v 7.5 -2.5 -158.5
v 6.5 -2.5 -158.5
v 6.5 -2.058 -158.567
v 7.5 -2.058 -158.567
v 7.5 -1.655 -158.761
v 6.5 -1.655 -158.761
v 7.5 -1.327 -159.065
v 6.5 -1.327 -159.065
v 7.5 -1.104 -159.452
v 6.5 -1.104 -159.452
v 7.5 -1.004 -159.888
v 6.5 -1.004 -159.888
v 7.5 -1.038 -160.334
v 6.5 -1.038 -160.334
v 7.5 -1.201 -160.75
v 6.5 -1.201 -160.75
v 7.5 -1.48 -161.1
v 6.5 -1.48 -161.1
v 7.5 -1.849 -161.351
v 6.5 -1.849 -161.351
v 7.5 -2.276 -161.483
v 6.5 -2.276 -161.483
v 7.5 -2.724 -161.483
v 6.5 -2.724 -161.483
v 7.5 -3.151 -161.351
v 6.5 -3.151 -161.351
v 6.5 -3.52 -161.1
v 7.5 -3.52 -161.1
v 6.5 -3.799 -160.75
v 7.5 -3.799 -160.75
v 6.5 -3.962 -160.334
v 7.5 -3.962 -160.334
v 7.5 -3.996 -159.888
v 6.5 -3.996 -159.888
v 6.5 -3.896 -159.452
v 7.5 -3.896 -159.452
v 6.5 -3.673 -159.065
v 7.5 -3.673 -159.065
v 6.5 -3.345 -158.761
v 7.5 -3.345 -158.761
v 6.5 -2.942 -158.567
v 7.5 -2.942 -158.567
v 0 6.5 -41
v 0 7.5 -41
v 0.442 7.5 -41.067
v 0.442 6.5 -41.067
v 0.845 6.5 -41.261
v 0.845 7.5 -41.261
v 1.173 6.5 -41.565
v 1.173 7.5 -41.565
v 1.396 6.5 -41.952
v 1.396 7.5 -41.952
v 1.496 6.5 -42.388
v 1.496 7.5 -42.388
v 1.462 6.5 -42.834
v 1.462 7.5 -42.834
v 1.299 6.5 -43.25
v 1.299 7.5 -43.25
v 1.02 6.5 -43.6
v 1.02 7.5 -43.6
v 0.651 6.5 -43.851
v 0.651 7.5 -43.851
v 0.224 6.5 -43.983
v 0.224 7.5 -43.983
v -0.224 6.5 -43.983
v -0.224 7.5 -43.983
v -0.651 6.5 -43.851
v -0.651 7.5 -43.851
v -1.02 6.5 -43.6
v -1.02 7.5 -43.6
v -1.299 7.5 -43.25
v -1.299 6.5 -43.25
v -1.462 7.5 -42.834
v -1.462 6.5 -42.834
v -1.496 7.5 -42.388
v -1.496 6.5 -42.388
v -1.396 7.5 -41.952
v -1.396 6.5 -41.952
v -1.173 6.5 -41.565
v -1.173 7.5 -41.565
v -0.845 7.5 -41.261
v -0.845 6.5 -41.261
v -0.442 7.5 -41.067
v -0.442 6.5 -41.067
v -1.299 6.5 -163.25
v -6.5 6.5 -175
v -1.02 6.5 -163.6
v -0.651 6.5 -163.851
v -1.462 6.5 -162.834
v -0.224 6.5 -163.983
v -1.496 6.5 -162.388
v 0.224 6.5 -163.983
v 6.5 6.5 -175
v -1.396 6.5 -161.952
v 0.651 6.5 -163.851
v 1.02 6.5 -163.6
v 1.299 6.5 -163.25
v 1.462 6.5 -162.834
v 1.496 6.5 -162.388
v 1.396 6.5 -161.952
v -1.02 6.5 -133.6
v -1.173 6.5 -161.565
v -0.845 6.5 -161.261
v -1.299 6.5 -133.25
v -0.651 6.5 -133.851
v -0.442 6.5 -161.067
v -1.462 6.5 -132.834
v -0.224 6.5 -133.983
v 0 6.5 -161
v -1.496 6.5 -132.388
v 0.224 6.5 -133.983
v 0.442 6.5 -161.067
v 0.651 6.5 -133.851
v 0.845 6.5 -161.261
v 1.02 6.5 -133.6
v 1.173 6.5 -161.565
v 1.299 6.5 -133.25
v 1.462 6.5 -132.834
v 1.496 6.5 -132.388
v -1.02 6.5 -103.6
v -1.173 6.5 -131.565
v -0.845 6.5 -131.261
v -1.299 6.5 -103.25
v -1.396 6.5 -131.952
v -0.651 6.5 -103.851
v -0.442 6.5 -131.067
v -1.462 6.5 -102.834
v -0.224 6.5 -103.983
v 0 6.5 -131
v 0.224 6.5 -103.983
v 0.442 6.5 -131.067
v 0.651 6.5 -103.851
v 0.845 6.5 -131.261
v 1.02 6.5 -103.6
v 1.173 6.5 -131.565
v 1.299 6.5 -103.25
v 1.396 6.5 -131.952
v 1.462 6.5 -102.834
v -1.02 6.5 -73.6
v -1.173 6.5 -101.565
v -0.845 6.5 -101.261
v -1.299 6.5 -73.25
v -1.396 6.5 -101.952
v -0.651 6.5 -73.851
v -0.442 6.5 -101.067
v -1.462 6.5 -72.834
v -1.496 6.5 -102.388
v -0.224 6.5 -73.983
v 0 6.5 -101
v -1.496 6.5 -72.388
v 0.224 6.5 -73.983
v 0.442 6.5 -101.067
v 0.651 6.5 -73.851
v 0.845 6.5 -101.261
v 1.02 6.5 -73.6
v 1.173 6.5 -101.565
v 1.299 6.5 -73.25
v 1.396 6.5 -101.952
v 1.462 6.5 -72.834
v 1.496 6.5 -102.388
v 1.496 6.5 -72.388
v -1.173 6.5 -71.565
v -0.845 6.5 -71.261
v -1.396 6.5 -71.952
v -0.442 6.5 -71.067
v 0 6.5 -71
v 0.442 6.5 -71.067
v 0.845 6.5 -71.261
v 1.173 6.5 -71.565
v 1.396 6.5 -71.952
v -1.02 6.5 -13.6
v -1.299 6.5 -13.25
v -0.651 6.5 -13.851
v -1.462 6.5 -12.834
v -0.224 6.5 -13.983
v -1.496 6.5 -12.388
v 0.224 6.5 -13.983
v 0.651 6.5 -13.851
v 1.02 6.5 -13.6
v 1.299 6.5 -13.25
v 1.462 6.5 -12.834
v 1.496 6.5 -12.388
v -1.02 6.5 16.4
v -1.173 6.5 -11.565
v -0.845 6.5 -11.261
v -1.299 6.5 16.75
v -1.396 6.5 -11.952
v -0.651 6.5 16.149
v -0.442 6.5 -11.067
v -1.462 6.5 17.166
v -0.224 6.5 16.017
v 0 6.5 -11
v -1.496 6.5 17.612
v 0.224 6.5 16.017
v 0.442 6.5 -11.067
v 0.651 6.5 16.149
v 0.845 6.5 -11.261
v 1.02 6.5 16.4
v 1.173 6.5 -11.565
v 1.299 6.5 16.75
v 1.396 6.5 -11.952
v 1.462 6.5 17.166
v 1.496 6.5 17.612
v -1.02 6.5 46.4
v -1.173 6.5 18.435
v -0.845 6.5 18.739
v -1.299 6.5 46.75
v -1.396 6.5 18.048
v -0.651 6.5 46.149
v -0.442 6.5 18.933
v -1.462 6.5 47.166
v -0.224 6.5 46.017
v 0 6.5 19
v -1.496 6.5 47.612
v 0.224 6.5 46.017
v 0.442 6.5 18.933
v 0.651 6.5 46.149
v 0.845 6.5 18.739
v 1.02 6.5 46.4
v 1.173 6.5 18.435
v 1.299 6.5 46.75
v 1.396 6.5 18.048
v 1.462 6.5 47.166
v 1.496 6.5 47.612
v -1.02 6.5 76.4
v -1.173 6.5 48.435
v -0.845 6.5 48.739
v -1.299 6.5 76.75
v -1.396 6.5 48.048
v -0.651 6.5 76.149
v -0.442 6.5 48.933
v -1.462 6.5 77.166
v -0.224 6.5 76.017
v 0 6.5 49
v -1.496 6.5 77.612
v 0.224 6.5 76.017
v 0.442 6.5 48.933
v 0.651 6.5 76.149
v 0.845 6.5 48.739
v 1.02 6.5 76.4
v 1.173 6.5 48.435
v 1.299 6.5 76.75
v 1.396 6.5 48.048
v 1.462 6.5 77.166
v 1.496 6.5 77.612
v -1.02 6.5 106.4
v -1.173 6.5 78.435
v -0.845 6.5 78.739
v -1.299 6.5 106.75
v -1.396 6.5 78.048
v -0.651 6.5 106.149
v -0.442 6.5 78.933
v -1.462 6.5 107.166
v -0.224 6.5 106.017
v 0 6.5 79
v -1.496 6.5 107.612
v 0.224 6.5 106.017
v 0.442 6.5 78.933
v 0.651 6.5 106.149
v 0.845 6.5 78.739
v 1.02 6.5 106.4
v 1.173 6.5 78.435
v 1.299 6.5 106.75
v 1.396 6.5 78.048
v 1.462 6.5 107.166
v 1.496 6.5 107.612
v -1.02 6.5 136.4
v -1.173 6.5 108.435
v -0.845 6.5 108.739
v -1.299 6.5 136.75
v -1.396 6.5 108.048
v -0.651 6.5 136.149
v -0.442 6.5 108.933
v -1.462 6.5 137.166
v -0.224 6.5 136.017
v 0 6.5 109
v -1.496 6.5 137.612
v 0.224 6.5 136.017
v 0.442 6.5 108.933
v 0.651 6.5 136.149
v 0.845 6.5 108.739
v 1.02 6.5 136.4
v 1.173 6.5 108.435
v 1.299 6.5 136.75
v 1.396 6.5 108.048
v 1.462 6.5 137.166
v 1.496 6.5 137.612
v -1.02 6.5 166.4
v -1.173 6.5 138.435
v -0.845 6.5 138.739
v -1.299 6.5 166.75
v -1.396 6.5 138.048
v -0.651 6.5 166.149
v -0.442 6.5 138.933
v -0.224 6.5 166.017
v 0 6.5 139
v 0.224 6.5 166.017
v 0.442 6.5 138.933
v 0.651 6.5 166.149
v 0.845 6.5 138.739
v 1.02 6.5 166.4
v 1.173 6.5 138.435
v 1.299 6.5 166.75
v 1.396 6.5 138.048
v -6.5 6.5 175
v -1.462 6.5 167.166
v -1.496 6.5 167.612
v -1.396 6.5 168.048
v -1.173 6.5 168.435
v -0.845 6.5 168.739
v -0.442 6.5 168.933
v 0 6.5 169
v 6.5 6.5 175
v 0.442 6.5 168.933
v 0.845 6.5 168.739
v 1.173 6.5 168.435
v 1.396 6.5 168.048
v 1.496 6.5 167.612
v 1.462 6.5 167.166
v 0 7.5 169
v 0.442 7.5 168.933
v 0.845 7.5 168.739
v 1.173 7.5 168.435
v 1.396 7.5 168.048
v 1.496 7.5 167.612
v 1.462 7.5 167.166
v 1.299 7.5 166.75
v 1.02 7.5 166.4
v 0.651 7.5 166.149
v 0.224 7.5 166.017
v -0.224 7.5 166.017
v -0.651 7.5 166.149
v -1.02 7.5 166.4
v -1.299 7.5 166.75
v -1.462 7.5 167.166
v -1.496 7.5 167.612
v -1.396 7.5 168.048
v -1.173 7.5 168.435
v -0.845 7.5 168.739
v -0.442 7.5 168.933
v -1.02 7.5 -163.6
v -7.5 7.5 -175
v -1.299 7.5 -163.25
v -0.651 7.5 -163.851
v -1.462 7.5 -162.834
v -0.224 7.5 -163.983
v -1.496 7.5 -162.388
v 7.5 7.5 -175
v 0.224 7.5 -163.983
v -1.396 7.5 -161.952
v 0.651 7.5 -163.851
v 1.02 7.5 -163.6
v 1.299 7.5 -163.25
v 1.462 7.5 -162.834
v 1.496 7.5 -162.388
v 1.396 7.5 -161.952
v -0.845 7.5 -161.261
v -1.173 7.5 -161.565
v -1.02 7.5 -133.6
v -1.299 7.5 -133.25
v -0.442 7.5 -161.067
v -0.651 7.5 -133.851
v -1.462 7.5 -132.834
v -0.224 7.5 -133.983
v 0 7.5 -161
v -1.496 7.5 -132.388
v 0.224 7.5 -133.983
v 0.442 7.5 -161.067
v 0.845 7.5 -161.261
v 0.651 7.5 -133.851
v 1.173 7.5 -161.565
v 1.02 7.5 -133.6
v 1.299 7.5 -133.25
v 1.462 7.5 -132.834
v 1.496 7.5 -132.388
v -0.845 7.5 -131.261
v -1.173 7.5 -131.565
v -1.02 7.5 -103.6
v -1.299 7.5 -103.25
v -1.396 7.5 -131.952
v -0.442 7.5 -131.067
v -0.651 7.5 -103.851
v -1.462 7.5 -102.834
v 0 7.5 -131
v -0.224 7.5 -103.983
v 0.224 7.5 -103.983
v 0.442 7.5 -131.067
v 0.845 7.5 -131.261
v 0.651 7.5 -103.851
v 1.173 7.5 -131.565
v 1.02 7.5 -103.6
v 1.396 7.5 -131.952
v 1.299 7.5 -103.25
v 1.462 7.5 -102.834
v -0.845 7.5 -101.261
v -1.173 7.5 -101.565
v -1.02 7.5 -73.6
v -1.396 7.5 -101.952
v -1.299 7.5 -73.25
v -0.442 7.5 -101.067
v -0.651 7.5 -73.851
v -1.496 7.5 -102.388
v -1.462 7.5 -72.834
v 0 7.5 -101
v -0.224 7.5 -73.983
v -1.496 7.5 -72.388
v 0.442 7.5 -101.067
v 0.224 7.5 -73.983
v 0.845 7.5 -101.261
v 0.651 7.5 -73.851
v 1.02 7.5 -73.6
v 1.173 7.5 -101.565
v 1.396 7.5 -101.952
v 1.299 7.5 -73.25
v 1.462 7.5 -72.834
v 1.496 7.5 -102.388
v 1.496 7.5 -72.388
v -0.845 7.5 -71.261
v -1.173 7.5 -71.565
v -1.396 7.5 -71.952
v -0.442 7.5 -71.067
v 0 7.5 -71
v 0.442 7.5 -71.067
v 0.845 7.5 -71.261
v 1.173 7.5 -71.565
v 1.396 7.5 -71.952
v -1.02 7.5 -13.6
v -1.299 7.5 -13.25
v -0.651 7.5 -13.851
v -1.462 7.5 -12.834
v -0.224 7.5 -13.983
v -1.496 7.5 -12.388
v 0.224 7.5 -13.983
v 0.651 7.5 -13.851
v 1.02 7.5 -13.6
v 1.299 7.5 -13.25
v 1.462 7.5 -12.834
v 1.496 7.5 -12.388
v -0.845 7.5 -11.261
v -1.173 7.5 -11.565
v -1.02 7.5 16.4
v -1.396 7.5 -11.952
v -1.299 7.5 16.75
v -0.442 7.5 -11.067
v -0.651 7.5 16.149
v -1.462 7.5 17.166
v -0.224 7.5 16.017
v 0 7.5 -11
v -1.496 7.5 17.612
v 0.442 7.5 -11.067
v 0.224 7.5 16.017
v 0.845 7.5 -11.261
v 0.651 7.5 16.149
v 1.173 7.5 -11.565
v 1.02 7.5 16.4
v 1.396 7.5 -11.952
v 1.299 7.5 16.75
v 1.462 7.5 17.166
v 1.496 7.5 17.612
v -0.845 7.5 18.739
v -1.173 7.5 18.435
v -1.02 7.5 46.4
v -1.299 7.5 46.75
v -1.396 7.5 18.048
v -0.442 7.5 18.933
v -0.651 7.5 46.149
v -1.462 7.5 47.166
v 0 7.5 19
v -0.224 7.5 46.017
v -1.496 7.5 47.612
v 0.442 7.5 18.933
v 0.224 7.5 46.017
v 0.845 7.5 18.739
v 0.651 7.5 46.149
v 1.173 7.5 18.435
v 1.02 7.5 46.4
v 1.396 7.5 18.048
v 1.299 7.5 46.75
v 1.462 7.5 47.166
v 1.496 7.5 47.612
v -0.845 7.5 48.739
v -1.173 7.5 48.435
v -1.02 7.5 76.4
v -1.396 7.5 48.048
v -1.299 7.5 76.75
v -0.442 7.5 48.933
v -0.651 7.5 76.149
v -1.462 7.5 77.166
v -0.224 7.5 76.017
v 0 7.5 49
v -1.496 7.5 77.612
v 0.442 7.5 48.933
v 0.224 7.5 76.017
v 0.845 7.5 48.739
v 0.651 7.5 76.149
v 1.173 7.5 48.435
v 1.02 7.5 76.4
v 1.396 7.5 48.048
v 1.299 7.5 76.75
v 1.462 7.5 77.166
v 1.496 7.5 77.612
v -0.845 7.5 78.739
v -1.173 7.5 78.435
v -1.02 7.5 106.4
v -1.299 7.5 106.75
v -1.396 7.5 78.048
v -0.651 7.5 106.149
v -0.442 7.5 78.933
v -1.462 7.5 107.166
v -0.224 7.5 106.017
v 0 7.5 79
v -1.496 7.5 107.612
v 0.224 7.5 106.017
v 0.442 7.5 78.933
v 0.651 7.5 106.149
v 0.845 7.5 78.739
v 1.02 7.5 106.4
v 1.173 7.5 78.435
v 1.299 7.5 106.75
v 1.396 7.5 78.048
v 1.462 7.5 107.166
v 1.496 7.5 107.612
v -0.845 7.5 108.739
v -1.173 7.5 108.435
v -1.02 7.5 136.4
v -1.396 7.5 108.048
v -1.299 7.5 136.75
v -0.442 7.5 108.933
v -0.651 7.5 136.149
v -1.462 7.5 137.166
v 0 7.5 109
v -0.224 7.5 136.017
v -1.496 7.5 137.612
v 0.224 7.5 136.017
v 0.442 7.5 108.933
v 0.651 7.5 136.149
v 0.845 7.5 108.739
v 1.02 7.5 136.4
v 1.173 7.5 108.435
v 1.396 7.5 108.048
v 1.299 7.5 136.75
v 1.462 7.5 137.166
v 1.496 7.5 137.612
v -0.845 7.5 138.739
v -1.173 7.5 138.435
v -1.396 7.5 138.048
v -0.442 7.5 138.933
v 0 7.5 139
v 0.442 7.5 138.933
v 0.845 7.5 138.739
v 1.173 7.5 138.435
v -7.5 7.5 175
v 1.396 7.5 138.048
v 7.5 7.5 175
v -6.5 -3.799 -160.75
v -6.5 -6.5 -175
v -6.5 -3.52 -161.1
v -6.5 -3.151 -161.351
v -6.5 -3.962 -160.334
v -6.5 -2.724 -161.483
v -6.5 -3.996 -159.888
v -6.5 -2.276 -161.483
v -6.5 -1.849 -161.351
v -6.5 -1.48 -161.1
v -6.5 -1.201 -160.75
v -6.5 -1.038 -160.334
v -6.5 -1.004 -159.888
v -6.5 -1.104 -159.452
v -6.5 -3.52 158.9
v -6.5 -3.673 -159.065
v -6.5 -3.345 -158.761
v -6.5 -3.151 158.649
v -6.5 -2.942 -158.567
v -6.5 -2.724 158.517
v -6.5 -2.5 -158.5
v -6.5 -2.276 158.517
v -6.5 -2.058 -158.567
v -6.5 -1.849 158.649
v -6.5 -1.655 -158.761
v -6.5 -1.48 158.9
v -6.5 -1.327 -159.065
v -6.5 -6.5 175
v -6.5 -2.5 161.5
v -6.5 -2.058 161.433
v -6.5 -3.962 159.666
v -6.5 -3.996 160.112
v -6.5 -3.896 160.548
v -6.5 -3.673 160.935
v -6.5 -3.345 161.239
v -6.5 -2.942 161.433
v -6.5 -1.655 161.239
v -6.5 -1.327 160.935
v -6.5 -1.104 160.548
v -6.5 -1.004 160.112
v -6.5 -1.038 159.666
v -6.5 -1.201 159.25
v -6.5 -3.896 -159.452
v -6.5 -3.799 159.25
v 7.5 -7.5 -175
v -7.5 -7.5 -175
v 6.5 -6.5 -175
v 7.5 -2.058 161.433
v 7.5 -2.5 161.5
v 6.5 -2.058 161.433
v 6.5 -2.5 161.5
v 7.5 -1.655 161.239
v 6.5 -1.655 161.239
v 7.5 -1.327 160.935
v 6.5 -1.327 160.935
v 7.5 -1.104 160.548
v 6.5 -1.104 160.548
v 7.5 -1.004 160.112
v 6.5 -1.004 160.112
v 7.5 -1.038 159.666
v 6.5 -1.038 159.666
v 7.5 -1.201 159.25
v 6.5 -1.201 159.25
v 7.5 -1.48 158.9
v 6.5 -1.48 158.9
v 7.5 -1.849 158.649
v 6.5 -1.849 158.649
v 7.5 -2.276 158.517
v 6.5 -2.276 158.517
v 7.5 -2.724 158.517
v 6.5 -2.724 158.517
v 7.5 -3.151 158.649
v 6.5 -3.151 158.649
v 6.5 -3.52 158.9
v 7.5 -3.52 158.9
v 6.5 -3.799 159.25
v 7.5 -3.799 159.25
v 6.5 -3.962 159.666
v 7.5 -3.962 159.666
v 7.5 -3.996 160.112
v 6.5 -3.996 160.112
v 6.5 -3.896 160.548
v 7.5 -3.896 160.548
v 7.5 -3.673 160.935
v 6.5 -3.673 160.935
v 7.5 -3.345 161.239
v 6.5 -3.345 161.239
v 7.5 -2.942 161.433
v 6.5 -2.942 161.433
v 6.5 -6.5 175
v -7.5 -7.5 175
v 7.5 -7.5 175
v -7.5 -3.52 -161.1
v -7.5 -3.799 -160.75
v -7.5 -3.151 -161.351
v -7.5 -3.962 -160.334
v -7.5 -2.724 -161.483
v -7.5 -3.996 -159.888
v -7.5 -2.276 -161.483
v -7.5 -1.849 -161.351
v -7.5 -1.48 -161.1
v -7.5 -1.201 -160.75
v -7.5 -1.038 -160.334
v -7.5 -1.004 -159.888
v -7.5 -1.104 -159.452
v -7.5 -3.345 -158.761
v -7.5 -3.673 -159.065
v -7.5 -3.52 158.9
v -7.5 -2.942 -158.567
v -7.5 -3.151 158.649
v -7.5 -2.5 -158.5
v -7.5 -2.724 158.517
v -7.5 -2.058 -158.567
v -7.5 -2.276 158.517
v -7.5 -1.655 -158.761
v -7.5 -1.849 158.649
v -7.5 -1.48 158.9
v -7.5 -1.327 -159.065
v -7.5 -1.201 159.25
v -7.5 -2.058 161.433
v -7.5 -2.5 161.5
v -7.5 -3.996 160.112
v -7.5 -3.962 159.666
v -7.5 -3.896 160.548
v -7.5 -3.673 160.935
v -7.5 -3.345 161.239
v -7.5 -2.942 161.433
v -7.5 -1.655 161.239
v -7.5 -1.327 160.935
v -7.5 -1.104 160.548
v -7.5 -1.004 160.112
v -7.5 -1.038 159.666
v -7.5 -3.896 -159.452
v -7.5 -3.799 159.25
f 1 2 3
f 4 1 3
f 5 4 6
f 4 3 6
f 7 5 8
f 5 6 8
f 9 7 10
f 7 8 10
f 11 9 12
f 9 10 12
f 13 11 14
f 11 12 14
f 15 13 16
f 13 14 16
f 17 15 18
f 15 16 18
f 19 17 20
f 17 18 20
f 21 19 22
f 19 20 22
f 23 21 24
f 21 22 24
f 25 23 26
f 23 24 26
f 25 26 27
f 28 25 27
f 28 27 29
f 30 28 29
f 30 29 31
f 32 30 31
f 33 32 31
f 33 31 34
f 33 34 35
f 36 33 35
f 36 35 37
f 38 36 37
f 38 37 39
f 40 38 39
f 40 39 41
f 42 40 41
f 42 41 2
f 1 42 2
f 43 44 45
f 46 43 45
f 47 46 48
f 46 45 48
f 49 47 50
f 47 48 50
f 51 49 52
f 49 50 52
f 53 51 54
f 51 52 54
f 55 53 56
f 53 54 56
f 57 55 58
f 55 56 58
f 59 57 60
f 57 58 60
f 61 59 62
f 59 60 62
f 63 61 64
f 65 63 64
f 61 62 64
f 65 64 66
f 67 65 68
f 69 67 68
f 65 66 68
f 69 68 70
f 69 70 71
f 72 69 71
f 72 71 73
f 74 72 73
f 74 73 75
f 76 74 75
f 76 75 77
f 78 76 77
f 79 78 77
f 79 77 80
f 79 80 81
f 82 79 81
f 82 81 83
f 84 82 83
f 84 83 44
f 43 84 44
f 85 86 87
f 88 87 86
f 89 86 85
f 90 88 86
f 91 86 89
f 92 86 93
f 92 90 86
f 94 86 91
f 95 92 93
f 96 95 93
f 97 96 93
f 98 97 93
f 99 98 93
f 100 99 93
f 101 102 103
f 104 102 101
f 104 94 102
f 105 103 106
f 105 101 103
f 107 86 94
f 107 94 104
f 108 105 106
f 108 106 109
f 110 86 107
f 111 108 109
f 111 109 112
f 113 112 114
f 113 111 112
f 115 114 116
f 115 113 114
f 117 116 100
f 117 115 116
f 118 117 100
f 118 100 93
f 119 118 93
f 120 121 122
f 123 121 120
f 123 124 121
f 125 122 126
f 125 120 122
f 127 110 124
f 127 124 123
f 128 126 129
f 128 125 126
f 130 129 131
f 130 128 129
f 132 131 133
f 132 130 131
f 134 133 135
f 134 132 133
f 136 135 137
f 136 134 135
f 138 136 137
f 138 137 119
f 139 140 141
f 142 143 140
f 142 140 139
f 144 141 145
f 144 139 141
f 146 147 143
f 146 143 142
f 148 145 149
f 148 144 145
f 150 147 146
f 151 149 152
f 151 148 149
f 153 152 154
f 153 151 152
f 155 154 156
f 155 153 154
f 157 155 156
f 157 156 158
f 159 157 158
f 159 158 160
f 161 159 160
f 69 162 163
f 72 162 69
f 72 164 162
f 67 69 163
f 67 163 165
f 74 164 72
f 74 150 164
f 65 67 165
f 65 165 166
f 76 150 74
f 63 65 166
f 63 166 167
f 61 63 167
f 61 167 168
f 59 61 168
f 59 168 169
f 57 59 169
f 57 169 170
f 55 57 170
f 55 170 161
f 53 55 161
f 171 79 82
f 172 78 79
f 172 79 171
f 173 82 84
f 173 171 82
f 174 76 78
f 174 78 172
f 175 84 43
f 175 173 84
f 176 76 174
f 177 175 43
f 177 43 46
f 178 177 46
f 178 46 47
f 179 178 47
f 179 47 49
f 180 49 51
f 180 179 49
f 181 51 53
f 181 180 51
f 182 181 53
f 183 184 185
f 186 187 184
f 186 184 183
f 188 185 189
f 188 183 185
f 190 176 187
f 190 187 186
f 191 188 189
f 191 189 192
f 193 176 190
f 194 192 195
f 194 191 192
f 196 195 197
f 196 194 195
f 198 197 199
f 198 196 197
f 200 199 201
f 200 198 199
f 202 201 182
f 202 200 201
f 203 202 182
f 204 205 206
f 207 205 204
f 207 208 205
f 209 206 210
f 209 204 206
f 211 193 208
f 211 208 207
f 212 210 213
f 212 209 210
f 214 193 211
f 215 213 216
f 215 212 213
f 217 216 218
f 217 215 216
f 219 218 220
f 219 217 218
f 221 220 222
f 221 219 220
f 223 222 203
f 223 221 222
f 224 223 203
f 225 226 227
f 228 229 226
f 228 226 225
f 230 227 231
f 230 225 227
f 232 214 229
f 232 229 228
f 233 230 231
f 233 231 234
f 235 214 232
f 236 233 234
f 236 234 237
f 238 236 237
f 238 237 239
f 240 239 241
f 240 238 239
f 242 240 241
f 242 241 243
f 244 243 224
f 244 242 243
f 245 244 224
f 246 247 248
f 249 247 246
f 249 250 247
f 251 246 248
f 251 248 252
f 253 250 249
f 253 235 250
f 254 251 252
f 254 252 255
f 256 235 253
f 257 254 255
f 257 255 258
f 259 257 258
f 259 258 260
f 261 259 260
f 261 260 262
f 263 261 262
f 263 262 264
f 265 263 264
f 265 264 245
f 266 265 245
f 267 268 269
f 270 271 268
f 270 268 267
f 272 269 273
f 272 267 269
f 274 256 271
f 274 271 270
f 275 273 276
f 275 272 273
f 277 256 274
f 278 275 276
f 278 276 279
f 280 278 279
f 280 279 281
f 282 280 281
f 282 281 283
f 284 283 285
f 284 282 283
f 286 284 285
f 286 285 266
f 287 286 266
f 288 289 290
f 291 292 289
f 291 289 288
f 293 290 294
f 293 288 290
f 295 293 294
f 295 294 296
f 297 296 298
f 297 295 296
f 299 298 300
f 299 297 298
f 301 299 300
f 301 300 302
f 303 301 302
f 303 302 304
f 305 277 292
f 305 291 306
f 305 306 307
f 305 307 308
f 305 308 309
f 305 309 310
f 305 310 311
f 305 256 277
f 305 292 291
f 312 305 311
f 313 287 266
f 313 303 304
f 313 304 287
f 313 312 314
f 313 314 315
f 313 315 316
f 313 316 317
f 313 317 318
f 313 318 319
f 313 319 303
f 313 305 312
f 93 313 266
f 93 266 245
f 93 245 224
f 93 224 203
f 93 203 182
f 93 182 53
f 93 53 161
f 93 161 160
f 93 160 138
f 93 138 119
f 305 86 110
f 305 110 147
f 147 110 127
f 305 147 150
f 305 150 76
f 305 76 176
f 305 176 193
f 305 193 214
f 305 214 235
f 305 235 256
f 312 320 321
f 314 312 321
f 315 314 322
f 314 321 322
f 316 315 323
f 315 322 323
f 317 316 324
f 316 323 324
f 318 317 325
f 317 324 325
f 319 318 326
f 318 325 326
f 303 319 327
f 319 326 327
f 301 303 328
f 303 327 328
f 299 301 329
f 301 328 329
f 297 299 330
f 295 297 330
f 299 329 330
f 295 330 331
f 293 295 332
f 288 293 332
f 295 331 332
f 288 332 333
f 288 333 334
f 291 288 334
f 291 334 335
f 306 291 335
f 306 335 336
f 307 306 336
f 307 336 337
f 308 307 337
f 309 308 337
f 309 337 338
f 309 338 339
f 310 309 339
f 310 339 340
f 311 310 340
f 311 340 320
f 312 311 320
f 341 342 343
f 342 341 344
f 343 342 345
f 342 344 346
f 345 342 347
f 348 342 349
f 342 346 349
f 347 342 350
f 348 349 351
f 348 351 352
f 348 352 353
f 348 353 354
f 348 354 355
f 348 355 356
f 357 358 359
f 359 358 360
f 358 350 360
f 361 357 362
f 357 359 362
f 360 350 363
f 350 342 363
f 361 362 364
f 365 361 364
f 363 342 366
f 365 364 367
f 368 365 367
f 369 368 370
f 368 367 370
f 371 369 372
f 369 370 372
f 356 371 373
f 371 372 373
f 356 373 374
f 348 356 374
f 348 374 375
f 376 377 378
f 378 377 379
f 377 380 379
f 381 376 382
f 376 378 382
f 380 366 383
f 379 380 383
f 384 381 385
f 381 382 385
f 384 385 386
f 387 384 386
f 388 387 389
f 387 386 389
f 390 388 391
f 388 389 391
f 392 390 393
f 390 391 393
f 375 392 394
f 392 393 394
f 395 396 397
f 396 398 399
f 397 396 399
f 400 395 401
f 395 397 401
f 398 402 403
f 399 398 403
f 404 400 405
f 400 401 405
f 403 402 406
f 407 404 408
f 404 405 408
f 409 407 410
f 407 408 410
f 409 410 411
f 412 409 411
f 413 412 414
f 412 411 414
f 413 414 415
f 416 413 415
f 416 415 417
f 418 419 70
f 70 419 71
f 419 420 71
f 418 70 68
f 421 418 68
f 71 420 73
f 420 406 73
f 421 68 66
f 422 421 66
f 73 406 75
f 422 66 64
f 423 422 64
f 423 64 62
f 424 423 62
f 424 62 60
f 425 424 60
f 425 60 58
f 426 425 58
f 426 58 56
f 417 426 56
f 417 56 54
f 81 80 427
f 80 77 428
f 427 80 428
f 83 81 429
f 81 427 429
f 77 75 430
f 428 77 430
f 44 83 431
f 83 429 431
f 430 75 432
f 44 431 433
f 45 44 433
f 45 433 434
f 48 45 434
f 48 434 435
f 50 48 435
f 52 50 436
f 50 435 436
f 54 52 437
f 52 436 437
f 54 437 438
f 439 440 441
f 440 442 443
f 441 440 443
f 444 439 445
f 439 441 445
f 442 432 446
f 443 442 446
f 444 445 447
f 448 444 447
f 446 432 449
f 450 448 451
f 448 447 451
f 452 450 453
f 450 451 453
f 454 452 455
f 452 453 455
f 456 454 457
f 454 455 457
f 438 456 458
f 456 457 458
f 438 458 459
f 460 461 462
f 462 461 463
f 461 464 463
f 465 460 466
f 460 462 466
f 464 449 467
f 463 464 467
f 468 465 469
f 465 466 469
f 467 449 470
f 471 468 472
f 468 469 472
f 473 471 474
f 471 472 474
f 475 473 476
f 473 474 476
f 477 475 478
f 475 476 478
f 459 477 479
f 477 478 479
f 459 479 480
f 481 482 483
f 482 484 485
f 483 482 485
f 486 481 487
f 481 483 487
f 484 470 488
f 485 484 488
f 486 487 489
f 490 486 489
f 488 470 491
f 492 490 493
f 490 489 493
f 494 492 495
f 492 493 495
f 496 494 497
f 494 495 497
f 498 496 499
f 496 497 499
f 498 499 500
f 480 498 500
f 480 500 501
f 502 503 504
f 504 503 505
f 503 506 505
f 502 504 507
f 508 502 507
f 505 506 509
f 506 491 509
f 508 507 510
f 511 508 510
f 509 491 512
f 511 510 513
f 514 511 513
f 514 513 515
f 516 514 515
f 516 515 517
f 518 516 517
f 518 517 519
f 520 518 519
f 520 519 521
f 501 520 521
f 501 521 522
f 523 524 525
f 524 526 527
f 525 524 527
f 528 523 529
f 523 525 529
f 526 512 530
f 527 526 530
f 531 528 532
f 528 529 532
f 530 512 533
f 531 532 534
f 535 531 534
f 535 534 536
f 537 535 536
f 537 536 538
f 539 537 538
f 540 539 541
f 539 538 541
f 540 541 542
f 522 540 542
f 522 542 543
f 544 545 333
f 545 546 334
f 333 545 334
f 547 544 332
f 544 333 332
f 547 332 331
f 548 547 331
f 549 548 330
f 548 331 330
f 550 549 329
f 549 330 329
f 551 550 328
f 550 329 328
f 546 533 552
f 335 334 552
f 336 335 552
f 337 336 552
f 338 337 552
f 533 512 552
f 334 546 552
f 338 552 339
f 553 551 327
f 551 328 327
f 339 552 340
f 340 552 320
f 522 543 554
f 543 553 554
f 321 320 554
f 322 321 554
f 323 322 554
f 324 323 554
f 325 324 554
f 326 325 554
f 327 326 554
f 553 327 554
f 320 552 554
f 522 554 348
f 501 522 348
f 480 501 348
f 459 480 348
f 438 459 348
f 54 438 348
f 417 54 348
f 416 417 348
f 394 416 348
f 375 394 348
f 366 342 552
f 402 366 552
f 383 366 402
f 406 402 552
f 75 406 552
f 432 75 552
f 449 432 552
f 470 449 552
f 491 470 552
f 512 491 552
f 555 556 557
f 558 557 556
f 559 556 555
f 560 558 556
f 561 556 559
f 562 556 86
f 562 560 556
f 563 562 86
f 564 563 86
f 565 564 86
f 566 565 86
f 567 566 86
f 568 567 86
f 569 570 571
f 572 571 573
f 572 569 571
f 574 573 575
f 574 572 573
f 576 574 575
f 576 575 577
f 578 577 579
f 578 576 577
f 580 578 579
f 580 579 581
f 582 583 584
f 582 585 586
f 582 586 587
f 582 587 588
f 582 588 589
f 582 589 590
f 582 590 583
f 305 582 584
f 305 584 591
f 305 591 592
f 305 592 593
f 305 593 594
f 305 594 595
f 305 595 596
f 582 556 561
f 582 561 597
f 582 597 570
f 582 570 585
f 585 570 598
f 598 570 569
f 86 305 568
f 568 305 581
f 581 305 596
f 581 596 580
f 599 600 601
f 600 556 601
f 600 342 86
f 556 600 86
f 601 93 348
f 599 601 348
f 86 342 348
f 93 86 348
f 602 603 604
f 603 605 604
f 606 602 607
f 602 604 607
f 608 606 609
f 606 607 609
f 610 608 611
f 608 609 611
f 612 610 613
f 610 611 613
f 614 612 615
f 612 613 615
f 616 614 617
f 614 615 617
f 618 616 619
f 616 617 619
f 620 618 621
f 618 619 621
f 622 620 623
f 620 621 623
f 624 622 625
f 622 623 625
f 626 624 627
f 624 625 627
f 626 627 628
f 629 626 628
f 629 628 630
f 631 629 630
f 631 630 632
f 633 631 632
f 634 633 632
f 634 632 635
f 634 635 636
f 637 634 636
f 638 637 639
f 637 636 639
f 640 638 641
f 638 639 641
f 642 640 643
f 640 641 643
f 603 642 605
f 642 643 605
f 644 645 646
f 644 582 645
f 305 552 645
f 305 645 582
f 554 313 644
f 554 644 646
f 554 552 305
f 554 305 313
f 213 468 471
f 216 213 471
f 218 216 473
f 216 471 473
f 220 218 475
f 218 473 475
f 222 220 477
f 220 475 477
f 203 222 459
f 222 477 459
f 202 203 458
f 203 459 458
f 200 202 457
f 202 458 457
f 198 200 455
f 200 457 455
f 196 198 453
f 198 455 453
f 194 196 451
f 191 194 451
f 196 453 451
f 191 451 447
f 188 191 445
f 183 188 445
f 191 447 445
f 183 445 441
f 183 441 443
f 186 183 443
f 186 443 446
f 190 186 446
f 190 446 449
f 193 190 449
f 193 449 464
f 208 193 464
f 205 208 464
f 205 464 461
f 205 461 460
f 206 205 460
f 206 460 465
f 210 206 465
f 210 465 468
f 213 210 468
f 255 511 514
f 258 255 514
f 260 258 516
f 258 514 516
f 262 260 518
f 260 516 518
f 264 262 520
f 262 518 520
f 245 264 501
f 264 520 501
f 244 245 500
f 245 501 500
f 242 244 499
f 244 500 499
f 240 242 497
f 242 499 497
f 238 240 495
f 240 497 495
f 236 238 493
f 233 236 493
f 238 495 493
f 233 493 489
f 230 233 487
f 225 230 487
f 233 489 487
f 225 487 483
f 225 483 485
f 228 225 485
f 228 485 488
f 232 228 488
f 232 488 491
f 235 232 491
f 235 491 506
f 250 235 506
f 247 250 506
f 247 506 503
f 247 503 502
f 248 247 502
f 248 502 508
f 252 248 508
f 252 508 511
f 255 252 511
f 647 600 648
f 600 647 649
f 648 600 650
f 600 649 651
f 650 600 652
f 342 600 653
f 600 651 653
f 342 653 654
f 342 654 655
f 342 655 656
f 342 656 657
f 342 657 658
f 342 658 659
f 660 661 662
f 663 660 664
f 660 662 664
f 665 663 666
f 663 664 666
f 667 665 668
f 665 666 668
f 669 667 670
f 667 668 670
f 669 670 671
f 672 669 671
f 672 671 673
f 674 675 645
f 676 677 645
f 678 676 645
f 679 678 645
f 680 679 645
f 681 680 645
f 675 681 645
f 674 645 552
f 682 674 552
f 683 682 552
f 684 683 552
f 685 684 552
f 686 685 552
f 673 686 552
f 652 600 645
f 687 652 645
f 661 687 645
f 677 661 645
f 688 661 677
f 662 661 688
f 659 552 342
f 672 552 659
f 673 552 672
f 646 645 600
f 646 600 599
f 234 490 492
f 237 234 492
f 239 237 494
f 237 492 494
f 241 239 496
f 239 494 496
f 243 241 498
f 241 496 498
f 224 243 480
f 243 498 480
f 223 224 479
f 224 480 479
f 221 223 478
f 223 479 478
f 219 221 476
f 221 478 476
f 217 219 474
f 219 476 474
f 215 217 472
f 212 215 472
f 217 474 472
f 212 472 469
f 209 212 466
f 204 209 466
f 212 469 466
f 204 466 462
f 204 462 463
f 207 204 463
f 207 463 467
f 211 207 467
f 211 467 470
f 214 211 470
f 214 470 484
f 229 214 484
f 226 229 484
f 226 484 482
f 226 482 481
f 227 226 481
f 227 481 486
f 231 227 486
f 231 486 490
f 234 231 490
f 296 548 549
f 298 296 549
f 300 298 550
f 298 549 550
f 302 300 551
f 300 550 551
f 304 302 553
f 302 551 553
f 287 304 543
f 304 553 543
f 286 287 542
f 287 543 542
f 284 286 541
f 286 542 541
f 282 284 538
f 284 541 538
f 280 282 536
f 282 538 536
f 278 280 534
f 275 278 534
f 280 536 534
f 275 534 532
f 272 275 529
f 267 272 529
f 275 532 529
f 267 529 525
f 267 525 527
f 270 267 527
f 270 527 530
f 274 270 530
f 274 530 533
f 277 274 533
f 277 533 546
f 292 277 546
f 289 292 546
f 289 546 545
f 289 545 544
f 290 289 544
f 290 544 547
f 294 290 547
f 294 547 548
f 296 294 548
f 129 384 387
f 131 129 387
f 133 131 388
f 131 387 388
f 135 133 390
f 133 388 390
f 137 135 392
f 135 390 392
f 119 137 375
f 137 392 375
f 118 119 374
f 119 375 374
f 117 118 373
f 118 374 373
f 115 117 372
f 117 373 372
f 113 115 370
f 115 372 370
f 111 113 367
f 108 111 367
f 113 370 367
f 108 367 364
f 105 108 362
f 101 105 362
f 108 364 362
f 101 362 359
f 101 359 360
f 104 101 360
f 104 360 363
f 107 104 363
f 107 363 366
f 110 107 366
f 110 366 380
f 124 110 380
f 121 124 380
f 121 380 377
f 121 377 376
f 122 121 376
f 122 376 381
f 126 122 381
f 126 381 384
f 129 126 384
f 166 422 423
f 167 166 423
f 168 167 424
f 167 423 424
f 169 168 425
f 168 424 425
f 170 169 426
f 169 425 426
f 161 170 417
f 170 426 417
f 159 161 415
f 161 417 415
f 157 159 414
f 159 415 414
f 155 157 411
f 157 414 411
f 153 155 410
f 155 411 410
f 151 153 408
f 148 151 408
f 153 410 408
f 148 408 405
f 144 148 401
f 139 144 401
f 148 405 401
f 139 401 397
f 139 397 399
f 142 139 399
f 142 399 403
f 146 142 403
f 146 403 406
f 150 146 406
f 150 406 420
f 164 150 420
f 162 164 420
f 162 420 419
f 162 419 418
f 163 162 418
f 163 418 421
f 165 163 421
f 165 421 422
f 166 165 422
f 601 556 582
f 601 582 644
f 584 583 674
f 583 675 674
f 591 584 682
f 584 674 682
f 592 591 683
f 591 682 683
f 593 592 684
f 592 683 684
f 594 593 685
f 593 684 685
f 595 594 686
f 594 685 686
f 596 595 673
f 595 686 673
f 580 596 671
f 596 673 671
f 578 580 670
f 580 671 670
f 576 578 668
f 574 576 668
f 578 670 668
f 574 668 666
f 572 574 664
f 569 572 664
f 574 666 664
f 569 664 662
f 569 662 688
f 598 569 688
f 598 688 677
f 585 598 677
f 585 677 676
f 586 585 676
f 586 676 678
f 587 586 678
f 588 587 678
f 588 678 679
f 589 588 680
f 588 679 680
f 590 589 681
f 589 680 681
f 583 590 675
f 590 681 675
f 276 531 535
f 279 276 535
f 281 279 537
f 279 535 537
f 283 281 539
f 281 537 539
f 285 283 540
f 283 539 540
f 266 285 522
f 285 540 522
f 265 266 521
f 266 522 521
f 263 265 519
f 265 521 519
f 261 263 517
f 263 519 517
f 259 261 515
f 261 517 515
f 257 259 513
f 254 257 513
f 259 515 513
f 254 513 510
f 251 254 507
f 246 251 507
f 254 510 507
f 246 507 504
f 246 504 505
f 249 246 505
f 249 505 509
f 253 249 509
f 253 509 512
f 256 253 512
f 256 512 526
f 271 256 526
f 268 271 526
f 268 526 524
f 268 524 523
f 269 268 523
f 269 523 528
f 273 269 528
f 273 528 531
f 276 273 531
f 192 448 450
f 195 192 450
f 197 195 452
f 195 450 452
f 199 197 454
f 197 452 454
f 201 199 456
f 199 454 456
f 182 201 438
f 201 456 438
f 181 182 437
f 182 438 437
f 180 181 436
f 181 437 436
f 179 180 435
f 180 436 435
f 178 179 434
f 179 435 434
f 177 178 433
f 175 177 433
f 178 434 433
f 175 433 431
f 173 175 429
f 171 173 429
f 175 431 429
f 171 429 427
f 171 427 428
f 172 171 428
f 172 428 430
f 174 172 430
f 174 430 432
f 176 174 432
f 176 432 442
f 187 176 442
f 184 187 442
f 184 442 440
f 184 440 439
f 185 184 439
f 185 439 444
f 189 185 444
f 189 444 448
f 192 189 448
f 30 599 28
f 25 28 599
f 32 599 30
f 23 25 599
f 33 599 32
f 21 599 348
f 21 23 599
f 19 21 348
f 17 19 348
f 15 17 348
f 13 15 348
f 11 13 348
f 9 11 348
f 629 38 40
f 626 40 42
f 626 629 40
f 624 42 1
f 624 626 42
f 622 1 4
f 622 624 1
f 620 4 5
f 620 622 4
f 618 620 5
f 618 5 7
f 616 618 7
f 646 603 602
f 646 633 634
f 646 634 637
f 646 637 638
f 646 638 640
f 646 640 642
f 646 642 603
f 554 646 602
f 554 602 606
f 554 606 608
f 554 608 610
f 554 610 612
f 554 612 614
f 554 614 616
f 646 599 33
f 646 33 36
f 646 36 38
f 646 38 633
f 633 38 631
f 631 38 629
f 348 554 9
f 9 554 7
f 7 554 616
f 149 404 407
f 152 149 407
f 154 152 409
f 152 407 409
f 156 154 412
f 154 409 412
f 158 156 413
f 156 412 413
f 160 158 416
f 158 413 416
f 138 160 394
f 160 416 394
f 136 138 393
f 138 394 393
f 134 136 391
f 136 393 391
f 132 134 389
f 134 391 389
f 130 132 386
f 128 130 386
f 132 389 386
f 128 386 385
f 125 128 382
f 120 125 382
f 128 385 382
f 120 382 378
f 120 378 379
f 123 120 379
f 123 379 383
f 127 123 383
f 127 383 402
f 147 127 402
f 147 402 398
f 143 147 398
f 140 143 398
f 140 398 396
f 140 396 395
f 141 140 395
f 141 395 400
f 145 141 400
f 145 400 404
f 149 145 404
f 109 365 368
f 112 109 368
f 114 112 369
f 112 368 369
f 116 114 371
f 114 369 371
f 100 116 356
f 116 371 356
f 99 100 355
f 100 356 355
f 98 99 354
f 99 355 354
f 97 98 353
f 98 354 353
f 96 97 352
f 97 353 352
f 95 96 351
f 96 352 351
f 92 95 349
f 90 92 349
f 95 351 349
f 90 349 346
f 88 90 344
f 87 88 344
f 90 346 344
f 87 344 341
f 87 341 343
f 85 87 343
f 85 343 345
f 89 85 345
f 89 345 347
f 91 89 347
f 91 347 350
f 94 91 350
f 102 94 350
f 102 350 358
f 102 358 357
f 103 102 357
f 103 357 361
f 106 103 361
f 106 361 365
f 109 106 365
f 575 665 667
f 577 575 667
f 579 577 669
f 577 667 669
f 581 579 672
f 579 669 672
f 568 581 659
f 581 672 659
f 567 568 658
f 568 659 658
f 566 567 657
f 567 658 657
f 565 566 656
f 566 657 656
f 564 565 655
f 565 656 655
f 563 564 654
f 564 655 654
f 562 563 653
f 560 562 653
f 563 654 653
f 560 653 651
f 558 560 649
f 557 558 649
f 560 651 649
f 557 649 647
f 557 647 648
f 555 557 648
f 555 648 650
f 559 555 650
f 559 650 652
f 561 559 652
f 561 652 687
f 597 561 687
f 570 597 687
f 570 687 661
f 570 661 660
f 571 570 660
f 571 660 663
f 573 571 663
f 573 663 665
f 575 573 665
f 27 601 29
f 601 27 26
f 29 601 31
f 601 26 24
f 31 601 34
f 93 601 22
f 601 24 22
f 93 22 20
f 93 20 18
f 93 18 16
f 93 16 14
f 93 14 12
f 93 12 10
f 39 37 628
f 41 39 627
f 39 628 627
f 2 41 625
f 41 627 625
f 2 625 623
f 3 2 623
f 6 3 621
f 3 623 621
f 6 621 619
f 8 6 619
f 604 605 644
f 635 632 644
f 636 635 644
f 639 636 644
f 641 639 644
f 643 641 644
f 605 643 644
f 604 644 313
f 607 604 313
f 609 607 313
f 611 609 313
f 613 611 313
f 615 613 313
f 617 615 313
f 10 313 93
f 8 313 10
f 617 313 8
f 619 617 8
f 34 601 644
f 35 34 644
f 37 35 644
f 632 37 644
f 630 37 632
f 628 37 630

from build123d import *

# Parameters (mm, degrees)
SKETCH_1_W             = 15
SKETCH_1_H             = 15
SKETCH_1_W_2           = 13
SKETCH_1_H_2           = 13
EXTRUDE_1_DEPTH        = 175
SKETCH_2_R             = 1.5
CUT_EXTRUDE_1_DEPTH    = 30
SKETCH_3_R             = 1.5
CUT_EXTRUDE_2_DEPTH    = 5
PATTERN_LINEAR_1_COUNT = 12
PATTERN_LINEAR_1_PITCH = 30


with BuildPart() as part:
    # 草图1 → 凸台-拉伸1 (new, symmetric)
    with BuildSketch(Plane.XY):
        Rectangle(SKETCH_1_W, SKETCH_1_H)
        Rectangle(SKETCH_1_W_2, SKETCH_1_H_2, mode=Mode.SUBTRACT)
    extrude(amount=EXTRUDE_1_DEPTH, both=True)

    # 草图2 → 切除-拉伸1 (cut, symmetric)
    with BuildSketch(Plane.ZY.offset(7.5)):
        with Locations((-160, -2.5)):
            Circle(SKETCH_2_R)
        with Locations((160, -2.5)):
            Circle(SKETCH_2_R)
    extrude(amount=CUT_EXTRUDE_1_DEPTH, both=True, mode=Mode.SUBTRACT)

    # 草图3 → 切除-拉伸2 (cut)
    with BuildSketch(Plane(origin=(0, 7.5, 0), x_dir=(1, 0, 0), z_dir=(0, 1, 0))):
        with Locations(Location((0, -167.5, 0), (0, 0, 270))):
            Circle(SKETCH_3_R)
    cut_extrude_2 = extrude(amount=-CUT_EXTRUDE_2_DEPTH, mode=Mode.SUBTRACT)

    # 阵列(线性)1: 切除-拉伸2 ×12
    with Locations(*[(0, 0, -i * PATTERN_LINEAR_1_PITCH) for i in range(1, PATTERN_LINEAR_1_COUNT)]):
        add(cut_extrude_2, mode=Mode.SUBTRACT)


solid = part.part
